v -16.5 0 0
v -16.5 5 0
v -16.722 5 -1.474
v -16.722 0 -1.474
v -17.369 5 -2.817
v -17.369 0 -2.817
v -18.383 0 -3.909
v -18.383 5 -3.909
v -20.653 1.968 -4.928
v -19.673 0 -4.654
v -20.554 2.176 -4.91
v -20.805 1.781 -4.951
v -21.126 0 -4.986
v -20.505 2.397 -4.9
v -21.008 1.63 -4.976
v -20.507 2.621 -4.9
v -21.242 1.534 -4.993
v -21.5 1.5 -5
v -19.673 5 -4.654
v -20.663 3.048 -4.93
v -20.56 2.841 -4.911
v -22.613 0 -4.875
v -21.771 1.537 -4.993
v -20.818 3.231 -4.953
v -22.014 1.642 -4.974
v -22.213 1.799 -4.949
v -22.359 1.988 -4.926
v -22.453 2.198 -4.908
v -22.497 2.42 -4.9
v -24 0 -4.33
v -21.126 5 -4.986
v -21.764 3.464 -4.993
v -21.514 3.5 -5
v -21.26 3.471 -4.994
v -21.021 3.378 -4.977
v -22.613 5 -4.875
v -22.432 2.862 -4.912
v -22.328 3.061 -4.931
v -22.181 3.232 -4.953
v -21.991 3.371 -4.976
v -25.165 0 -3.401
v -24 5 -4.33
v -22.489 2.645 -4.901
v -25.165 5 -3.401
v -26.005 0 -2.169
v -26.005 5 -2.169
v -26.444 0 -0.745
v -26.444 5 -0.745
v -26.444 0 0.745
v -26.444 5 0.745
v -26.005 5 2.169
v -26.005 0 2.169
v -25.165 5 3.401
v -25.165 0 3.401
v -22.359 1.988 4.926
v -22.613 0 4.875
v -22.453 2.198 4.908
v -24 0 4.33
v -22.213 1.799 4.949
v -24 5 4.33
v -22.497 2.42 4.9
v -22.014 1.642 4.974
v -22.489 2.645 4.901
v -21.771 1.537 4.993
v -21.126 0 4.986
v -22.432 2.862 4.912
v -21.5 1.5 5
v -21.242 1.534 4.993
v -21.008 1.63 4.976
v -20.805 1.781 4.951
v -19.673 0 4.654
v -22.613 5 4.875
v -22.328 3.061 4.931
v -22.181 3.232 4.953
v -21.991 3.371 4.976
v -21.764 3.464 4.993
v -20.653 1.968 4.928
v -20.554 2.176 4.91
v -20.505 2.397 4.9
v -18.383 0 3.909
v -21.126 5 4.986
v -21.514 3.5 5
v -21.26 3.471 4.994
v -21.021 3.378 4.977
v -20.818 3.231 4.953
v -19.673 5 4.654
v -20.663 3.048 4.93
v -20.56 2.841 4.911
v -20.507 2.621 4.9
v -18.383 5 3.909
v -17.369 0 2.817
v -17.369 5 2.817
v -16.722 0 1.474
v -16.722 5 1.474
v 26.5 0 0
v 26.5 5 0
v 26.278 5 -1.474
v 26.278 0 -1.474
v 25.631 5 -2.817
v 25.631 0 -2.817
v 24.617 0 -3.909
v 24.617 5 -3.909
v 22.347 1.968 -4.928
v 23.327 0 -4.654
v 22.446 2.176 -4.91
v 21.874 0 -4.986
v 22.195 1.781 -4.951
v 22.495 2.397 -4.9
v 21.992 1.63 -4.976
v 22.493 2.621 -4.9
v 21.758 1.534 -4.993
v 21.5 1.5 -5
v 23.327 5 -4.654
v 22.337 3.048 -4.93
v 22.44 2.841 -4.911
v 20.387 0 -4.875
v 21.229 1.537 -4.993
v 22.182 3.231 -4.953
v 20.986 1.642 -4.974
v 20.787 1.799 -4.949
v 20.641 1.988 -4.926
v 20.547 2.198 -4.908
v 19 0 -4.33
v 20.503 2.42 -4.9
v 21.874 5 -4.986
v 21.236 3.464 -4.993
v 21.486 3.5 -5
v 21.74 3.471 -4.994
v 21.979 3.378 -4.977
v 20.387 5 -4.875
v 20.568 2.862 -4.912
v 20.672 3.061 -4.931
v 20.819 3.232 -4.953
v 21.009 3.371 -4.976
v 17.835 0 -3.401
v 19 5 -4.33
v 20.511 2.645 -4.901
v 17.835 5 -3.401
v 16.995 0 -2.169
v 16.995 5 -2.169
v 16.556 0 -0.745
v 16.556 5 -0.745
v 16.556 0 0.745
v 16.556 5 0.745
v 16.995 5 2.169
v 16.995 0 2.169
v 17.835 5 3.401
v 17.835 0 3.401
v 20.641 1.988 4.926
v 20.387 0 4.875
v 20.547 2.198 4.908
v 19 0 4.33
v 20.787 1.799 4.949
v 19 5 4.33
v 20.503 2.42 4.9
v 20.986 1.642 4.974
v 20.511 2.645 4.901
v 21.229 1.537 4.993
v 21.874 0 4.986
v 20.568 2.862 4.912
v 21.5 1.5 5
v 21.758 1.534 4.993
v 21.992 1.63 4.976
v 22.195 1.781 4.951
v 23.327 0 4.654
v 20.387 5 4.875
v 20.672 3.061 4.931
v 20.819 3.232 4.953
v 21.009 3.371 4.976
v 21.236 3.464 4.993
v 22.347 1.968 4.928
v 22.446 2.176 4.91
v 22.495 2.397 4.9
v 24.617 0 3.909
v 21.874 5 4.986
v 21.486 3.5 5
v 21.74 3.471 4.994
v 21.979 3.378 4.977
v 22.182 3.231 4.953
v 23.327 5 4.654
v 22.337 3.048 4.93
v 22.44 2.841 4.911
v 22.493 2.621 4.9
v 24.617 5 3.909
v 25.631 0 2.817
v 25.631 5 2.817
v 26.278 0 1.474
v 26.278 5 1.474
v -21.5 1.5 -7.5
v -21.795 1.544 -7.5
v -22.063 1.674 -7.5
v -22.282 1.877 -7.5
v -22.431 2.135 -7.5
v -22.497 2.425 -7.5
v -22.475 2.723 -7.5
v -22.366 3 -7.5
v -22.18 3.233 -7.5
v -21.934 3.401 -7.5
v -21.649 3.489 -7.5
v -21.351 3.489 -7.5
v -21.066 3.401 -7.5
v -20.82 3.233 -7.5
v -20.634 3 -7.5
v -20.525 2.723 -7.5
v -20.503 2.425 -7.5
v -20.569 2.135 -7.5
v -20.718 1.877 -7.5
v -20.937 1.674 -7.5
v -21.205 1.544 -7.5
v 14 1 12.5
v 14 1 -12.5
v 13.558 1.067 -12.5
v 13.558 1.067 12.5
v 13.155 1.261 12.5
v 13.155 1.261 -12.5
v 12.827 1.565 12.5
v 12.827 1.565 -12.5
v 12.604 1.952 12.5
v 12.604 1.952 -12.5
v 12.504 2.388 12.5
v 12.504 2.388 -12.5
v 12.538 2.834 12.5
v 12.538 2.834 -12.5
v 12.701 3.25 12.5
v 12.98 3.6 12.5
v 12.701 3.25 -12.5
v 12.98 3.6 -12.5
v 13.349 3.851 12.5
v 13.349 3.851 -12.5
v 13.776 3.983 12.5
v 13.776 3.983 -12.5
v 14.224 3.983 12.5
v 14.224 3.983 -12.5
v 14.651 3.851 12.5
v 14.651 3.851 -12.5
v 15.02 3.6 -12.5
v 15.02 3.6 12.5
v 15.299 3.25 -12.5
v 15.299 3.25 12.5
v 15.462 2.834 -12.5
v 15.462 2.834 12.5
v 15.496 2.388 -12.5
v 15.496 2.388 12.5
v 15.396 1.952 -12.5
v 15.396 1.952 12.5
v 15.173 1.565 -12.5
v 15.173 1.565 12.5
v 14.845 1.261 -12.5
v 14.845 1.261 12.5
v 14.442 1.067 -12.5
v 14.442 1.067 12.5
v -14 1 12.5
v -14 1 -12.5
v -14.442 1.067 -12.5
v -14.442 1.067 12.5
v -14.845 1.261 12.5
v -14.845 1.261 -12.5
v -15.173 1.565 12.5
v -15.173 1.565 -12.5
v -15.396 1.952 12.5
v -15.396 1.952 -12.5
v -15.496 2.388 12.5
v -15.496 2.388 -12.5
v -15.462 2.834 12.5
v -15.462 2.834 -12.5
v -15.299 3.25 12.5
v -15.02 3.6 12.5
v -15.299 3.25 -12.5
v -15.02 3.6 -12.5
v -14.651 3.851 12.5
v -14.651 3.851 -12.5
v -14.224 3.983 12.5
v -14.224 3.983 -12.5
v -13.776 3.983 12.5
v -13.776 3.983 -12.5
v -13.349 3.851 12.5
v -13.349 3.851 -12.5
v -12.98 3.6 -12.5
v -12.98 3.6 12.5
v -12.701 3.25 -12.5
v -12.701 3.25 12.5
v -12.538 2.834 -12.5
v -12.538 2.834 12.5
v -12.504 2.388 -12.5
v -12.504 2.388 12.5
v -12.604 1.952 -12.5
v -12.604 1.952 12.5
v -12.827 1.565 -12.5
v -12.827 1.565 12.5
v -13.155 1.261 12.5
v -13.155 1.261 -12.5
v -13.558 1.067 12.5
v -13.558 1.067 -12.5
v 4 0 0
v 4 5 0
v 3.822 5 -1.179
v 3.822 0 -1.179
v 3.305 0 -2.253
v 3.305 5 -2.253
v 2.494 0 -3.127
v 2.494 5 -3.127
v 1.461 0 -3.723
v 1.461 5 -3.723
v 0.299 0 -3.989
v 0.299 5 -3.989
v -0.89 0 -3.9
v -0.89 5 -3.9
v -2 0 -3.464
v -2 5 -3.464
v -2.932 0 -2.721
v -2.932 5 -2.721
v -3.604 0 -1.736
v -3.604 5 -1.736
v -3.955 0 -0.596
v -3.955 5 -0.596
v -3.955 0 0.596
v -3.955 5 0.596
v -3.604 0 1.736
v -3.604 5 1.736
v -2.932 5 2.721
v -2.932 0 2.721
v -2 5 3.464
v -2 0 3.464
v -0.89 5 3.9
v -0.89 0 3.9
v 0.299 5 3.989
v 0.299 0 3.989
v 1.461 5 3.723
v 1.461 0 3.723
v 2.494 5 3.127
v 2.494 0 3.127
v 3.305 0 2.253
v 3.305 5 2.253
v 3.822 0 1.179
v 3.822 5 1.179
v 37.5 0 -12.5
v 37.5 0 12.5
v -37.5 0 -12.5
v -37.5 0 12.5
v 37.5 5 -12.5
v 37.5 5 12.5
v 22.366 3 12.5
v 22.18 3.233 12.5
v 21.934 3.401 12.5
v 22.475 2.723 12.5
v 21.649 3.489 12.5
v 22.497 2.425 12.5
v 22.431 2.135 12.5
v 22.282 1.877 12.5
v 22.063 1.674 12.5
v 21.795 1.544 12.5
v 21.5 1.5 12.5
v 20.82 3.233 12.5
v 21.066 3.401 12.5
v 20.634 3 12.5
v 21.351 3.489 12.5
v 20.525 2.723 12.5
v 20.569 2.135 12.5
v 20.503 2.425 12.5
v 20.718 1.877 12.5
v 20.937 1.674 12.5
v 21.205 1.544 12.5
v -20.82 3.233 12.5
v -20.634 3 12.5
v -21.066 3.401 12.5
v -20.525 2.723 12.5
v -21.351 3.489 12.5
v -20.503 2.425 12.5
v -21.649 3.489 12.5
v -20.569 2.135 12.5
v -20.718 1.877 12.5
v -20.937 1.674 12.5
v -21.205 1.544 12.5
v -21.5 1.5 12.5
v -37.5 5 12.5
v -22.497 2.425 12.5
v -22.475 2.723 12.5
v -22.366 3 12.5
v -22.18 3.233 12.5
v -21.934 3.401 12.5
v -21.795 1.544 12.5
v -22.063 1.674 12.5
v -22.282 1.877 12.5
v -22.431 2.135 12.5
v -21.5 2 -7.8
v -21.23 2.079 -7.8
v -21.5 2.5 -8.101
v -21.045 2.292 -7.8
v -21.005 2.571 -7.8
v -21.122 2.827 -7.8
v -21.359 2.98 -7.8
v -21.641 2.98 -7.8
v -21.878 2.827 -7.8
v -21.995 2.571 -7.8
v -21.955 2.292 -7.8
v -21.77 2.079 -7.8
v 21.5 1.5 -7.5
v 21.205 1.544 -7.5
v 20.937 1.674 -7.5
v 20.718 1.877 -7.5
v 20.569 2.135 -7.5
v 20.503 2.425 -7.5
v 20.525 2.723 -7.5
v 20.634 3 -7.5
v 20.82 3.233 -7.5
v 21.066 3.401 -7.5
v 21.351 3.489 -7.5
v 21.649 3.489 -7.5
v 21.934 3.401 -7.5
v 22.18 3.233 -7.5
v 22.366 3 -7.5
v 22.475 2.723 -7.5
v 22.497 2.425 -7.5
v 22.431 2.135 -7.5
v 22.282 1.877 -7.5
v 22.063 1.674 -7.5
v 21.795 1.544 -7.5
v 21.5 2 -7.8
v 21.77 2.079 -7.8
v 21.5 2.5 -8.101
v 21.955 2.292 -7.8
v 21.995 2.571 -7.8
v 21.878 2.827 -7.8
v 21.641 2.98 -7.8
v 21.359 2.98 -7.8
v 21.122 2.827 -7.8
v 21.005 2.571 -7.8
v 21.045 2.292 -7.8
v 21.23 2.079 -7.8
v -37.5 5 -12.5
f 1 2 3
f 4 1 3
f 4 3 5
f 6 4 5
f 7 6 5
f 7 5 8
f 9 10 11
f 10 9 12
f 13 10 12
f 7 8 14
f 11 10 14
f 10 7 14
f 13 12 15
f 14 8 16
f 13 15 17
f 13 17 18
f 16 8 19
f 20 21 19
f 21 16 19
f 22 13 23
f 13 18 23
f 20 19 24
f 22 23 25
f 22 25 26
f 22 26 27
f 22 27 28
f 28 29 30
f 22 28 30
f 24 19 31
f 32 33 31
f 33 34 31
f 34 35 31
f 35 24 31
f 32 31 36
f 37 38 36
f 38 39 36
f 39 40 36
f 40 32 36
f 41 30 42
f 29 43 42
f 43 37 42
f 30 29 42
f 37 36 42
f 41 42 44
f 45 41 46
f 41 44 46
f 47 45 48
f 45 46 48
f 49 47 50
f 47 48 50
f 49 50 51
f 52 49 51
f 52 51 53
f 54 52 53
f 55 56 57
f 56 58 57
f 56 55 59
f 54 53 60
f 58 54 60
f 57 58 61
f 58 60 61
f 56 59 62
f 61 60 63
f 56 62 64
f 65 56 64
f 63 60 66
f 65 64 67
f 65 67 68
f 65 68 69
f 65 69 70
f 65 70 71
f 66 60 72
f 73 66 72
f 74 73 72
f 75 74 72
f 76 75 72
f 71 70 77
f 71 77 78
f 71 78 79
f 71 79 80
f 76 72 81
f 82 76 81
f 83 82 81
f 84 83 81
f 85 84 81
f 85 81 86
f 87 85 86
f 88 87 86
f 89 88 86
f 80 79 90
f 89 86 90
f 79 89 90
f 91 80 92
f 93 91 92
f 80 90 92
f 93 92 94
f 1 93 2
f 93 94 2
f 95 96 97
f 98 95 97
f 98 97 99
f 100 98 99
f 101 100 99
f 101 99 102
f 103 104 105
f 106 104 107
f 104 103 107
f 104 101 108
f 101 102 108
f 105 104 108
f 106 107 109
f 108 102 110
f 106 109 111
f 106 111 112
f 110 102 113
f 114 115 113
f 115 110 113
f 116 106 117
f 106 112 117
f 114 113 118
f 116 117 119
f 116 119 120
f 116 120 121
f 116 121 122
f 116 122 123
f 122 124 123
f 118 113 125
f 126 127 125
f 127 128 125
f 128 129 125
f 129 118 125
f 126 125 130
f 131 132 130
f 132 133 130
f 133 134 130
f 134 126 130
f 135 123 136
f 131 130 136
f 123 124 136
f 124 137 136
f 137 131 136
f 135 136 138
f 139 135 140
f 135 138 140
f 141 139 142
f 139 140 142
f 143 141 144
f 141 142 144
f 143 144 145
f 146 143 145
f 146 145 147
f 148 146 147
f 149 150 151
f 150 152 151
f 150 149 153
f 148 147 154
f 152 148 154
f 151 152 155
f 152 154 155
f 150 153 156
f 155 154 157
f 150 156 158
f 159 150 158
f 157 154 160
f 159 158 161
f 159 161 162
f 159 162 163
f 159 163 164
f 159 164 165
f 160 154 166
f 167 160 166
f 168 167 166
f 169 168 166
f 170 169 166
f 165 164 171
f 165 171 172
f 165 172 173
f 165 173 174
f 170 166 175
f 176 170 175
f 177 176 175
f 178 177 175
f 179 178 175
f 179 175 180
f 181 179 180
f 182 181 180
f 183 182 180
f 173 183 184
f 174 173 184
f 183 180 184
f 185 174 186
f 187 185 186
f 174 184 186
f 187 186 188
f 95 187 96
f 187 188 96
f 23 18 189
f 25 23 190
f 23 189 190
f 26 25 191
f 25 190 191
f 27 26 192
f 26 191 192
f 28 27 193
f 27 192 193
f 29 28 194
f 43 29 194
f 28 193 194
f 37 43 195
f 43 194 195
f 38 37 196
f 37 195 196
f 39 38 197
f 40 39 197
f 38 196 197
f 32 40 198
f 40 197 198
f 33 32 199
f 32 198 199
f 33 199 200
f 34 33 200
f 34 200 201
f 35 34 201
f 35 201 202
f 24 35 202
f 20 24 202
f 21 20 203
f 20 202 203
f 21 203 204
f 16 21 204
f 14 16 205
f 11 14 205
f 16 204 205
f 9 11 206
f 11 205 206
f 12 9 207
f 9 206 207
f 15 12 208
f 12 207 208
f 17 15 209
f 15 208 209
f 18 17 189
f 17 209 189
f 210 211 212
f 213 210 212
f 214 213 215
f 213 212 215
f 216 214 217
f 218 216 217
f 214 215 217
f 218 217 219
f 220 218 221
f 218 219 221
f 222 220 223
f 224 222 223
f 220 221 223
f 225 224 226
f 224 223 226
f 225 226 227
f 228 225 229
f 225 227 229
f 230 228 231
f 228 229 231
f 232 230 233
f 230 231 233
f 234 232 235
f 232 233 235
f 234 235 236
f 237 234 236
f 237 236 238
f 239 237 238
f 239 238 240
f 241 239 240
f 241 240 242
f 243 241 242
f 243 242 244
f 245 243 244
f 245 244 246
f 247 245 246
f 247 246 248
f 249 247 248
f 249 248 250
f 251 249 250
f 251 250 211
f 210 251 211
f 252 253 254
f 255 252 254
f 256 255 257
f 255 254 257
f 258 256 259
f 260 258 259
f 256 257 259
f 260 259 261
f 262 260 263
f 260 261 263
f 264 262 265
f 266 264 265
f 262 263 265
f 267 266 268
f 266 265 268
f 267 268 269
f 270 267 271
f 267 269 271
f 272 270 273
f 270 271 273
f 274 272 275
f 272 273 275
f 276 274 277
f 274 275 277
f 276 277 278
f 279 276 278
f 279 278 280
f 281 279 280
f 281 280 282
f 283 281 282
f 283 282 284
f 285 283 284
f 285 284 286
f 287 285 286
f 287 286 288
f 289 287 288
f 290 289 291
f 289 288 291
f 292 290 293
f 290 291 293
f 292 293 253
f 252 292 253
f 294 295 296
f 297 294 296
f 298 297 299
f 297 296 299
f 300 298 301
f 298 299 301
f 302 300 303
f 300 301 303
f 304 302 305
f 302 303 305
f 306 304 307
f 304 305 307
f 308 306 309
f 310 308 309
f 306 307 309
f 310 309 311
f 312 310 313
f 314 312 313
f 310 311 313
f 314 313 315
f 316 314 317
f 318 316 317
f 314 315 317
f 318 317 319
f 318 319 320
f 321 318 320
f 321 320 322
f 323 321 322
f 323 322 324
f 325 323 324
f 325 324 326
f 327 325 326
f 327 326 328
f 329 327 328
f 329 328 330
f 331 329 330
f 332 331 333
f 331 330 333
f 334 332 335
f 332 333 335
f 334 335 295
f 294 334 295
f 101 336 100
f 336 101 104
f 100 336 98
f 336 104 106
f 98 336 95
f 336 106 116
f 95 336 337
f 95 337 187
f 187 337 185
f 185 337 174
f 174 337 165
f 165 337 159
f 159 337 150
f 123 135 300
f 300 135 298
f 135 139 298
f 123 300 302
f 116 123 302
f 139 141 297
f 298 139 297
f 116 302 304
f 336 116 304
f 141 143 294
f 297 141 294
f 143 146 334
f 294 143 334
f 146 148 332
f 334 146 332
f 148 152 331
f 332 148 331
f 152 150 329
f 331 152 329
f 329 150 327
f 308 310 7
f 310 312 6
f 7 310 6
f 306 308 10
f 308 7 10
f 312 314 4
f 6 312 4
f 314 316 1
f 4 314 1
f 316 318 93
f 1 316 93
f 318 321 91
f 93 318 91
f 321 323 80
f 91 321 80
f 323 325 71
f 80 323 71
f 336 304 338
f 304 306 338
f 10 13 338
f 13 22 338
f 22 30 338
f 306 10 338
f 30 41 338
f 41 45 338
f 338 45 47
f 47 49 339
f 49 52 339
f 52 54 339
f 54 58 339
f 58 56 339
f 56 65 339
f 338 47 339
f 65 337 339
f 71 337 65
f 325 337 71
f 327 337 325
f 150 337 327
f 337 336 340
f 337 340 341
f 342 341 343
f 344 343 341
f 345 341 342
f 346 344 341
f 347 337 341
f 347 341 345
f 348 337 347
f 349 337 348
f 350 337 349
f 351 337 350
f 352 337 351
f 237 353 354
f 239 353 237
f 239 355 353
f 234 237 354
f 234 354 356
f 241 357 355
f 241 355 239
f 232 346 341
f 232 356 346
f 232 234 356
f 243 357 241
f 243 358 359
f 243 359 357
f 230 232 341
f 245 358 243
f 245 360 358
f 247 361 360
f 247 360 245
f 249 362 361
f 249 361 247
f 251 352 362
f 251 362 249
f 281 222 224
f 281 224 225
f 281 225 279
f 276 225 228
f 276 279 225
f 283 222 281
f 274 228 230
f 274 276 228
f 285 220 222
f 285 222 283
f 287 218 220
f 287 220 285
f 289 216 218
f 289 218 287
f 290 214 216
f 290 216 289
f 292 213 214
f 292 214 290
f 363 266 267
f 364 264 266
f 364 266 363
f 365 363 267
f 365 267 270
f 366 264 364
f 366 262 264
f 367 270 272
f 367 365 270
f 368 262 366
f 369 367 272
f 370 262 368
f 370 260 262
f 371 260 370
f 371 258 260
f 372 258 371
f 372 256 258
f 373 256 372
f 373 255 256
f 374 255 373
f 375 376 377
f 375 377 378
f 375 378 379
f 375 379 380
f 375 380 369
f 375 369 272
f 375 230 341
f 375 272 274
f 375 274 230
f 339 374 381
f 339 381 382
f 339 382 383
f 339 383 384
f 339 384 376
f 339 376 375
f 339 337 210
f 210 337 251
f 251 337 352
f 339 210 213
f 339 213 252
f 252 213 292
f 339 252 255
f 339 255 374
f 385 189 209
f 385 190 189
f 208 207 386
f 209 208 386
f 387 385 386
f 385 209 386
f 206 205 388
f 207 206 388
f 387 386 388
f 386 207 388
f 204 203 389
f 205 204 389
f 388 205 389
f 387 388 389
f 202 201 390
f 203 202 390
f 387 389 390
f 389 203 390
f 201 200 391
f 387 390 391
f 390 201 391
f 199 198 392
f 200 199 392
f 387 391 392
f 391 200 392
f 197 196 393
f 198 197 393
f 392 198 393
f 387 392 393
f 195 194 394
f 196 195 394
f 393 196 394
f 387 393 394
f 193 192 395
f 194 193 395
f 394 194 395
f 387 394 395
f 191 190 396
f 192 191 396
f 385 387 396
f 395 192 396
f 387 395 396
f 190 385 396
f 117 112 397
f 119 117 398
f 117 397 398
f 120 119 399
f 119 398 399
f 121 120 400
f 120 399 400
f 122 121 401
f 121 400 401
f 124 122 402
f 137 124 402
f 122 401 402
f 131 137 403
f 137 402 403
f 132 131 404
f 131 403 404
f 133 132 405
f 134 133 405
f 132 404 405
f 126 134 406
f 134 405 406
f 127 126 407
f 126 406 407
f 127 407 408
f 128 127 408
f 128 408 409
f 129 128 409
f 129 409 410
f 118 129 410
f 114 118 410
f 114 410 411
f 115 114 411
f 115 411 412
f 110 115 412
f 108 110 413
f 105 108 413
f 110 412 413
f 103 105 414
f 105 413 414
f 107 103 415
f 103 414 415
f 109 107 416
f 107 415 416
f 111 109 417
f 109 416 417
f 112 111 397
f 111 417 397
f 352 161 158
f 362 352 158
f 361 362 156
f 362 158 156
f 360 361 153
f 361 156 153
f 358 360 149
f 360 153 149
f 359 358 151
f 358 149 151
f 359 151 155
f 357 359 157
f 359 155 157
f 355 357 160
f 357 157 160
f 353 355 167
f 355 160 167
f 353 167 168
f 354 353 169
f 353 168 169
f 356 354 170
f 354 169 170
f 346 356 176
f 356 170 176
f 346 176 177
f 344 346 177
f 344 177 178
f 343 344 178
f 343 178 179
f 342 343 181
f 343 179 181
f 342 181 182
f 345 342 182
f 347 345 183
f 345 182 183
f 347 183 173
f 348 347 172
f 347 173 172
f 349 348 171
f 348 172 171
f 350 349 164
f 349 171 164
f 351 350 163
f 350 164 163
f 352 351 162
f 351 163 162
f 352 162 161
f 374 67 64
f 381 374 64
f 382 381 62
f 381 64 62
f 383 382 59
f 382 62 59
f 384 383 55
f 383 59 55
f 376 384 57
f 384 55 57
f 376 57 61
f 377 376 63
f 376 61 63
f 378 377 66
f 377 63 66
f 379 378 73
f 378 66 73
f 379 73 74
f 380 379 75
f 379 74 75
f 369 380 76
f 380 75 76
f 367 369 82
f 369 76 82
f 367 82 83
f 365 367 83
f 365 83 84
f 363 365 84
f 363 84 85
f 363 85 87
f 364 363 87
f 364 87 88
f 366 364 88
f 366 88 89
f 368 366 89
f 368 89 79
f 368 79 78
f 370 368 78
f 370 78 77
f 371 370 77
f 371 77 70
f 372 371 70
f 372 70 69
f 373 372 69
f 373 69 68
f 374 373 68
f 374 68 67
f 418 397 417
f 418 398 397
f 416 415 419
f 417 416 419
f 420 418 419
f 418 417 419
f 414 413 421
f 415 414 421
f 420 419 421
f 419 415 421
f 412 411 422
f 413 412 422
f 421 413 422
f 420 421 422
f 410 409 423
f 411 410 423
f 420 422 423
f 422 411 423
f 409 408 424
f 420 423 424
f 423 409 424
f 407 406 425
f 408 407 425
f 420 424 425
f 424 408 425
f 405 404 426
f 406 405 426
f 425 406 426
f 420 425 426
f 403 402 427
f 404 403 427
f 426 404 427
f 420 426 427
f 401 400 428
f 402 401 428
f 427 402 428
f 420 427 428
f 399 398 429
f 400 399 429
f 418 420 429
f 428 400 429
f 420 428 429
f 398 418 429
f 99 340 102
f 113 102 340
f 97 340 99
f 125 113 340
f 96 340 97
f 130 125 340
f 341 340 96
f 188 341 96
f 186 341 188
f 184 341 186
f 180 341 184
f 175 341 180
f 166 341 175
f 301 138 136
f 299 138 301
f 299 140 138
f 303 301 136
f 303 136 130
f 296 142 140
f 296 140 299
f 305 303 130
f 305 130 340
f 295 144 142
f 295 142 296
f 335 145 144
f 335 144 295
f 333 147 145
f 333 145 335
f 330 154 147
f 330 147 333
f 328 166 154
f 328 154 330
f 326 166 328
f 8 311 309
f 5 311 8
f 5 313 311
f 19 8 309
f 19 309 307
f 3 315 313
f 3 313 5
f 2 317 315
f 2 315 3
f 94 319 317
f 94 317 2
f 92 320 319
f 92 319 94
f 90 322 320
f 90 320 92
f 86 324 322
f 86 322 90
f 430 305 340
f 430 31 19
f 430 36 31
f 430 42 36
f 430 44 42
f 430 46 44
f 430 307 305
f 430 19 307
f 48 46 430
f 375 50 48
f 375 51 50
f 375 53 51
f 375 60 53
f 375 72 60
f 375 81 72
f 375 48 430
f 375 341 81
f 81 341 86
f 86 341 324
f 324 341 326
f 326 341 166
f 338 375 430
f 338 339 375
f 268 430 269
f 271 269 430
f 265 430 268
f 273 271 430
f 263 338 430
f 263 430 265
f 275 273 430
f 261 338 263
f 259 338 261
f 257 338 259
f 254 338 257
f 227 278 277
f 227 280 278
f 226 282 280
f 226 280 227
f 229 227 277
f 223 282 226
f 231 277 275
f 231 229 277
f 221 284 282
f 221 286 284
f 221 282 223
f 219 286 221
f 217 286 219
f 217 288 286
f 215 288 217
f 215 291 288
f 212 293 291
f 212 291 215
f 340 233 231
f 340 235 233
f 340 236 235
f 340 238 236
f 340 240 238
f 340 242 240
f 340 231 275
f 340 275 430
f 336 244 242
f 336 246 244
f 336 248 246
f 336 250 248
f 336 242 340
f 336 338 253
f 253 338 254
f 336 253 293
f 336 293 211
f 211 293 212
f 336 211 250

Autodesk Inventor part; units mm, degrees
ref_plane "YZ Plane" through (0, 0, 0) normal (1, 0, 0) x (0, 1, 0)
ref_plane "XZ Plane" through (0, 0, 0) normal (0, 1, 0) x (-1, 0, 0)
ref_plane "XY Plane" through (0, 0, 0) normal (0, 0, 1) x (1, 0, 0)
sketch "Boceto1" plane through (0, 0, 0) normal (0, 1, 0) x (-1, 0, 0)
  line L0 (-37.5, 12.5) -> (37.5, 12.5)
  line L1 (37.5, 12.5) -> (37.5, -12.5)
  line L2 (37.5, -12.5) -> (-37.5, -12.5)
  line L3 (-37.5, -12.5) -> (-37.5, 12.5)
  line L4 (-37.5, 12.5) -> (37.5, -12.5) construction
  line L5 (37.5, 12.5) -> (-37.5, -12.5) construction
  point P0 (0, 0)
  dimension "d4" = 25
  dimension "d5" = 75
extrude "Extrusión1" add sketch "Boceto1" along normal blind 5
sketch "Boceto2" plane through (-37.5, 0, 12.5) normal (0, 0, 1) x (1, 0, 0)
  line L0 (75, 0) -> (0, 0) projected
  line L1 (75, 0) -> (75, 5) projected
  line L2 (0, 5) -> (75, 5) projected
  line L3 (0, 0) -> (0, 5) projected
  line L4 (37.5, 0) -> (37.5, 5)
  point P0 (23.5, 2.5)
  point P1 (16, 2.5)
  point P2 (51.5, 2.5)
  point P3 (59, 2.5)
  dimension "d12" = 14
  dimension "d13" = 21.5
hole "Agujero1" at (-14, 2.5, 12.5) at (14, 2.5, 12.5) direction (0, 0, -1) diameter 3 end through all
hole "Agujero2" at (-21.5, 2.5, 12.5) at (21.5, 2.5, 12.5) direction (0, 0, -1) diameter 2 depth 20 tip angle 118
sketch "Boceto3" plane through (0, 5, 0) normal (0, 1, 0) x (1, 0, 0)
  circle A0 centre (-21.5, 0) radius 5
  line L0 (0, -9.1996) -> (0, 9.6209)
  circle A1 centre (21.5, 0) radius 5
  circle A2 centre (0, 0) radius 4
  dimension "d28" = 21.5
  dimension "d29" = 0
  dimension "d30" = 10
  dimension "d31" = 0
  dimension "d34" = 8
  dimension "d35" = 0
  dimension "d36" = 0
extrude "Extrusión2" cut sketch "Boceto3" against normal through all
equation "\"d4\" = 25 * scale"
equation "\"d5\" = 75 * scale"
equation "\"d2\" = 5 * scale"
equation "\"d12\" = 14 * scale"
equation "\"d13\" = 21.5 * scale"
equation "\"d28\" = 21.5 * scale"
equation "\"d30\" = 10 * scale"
equation "\"d34\" = 8 * scale"
equation "\"scale\" = 1"
properties part number "Placa2"
